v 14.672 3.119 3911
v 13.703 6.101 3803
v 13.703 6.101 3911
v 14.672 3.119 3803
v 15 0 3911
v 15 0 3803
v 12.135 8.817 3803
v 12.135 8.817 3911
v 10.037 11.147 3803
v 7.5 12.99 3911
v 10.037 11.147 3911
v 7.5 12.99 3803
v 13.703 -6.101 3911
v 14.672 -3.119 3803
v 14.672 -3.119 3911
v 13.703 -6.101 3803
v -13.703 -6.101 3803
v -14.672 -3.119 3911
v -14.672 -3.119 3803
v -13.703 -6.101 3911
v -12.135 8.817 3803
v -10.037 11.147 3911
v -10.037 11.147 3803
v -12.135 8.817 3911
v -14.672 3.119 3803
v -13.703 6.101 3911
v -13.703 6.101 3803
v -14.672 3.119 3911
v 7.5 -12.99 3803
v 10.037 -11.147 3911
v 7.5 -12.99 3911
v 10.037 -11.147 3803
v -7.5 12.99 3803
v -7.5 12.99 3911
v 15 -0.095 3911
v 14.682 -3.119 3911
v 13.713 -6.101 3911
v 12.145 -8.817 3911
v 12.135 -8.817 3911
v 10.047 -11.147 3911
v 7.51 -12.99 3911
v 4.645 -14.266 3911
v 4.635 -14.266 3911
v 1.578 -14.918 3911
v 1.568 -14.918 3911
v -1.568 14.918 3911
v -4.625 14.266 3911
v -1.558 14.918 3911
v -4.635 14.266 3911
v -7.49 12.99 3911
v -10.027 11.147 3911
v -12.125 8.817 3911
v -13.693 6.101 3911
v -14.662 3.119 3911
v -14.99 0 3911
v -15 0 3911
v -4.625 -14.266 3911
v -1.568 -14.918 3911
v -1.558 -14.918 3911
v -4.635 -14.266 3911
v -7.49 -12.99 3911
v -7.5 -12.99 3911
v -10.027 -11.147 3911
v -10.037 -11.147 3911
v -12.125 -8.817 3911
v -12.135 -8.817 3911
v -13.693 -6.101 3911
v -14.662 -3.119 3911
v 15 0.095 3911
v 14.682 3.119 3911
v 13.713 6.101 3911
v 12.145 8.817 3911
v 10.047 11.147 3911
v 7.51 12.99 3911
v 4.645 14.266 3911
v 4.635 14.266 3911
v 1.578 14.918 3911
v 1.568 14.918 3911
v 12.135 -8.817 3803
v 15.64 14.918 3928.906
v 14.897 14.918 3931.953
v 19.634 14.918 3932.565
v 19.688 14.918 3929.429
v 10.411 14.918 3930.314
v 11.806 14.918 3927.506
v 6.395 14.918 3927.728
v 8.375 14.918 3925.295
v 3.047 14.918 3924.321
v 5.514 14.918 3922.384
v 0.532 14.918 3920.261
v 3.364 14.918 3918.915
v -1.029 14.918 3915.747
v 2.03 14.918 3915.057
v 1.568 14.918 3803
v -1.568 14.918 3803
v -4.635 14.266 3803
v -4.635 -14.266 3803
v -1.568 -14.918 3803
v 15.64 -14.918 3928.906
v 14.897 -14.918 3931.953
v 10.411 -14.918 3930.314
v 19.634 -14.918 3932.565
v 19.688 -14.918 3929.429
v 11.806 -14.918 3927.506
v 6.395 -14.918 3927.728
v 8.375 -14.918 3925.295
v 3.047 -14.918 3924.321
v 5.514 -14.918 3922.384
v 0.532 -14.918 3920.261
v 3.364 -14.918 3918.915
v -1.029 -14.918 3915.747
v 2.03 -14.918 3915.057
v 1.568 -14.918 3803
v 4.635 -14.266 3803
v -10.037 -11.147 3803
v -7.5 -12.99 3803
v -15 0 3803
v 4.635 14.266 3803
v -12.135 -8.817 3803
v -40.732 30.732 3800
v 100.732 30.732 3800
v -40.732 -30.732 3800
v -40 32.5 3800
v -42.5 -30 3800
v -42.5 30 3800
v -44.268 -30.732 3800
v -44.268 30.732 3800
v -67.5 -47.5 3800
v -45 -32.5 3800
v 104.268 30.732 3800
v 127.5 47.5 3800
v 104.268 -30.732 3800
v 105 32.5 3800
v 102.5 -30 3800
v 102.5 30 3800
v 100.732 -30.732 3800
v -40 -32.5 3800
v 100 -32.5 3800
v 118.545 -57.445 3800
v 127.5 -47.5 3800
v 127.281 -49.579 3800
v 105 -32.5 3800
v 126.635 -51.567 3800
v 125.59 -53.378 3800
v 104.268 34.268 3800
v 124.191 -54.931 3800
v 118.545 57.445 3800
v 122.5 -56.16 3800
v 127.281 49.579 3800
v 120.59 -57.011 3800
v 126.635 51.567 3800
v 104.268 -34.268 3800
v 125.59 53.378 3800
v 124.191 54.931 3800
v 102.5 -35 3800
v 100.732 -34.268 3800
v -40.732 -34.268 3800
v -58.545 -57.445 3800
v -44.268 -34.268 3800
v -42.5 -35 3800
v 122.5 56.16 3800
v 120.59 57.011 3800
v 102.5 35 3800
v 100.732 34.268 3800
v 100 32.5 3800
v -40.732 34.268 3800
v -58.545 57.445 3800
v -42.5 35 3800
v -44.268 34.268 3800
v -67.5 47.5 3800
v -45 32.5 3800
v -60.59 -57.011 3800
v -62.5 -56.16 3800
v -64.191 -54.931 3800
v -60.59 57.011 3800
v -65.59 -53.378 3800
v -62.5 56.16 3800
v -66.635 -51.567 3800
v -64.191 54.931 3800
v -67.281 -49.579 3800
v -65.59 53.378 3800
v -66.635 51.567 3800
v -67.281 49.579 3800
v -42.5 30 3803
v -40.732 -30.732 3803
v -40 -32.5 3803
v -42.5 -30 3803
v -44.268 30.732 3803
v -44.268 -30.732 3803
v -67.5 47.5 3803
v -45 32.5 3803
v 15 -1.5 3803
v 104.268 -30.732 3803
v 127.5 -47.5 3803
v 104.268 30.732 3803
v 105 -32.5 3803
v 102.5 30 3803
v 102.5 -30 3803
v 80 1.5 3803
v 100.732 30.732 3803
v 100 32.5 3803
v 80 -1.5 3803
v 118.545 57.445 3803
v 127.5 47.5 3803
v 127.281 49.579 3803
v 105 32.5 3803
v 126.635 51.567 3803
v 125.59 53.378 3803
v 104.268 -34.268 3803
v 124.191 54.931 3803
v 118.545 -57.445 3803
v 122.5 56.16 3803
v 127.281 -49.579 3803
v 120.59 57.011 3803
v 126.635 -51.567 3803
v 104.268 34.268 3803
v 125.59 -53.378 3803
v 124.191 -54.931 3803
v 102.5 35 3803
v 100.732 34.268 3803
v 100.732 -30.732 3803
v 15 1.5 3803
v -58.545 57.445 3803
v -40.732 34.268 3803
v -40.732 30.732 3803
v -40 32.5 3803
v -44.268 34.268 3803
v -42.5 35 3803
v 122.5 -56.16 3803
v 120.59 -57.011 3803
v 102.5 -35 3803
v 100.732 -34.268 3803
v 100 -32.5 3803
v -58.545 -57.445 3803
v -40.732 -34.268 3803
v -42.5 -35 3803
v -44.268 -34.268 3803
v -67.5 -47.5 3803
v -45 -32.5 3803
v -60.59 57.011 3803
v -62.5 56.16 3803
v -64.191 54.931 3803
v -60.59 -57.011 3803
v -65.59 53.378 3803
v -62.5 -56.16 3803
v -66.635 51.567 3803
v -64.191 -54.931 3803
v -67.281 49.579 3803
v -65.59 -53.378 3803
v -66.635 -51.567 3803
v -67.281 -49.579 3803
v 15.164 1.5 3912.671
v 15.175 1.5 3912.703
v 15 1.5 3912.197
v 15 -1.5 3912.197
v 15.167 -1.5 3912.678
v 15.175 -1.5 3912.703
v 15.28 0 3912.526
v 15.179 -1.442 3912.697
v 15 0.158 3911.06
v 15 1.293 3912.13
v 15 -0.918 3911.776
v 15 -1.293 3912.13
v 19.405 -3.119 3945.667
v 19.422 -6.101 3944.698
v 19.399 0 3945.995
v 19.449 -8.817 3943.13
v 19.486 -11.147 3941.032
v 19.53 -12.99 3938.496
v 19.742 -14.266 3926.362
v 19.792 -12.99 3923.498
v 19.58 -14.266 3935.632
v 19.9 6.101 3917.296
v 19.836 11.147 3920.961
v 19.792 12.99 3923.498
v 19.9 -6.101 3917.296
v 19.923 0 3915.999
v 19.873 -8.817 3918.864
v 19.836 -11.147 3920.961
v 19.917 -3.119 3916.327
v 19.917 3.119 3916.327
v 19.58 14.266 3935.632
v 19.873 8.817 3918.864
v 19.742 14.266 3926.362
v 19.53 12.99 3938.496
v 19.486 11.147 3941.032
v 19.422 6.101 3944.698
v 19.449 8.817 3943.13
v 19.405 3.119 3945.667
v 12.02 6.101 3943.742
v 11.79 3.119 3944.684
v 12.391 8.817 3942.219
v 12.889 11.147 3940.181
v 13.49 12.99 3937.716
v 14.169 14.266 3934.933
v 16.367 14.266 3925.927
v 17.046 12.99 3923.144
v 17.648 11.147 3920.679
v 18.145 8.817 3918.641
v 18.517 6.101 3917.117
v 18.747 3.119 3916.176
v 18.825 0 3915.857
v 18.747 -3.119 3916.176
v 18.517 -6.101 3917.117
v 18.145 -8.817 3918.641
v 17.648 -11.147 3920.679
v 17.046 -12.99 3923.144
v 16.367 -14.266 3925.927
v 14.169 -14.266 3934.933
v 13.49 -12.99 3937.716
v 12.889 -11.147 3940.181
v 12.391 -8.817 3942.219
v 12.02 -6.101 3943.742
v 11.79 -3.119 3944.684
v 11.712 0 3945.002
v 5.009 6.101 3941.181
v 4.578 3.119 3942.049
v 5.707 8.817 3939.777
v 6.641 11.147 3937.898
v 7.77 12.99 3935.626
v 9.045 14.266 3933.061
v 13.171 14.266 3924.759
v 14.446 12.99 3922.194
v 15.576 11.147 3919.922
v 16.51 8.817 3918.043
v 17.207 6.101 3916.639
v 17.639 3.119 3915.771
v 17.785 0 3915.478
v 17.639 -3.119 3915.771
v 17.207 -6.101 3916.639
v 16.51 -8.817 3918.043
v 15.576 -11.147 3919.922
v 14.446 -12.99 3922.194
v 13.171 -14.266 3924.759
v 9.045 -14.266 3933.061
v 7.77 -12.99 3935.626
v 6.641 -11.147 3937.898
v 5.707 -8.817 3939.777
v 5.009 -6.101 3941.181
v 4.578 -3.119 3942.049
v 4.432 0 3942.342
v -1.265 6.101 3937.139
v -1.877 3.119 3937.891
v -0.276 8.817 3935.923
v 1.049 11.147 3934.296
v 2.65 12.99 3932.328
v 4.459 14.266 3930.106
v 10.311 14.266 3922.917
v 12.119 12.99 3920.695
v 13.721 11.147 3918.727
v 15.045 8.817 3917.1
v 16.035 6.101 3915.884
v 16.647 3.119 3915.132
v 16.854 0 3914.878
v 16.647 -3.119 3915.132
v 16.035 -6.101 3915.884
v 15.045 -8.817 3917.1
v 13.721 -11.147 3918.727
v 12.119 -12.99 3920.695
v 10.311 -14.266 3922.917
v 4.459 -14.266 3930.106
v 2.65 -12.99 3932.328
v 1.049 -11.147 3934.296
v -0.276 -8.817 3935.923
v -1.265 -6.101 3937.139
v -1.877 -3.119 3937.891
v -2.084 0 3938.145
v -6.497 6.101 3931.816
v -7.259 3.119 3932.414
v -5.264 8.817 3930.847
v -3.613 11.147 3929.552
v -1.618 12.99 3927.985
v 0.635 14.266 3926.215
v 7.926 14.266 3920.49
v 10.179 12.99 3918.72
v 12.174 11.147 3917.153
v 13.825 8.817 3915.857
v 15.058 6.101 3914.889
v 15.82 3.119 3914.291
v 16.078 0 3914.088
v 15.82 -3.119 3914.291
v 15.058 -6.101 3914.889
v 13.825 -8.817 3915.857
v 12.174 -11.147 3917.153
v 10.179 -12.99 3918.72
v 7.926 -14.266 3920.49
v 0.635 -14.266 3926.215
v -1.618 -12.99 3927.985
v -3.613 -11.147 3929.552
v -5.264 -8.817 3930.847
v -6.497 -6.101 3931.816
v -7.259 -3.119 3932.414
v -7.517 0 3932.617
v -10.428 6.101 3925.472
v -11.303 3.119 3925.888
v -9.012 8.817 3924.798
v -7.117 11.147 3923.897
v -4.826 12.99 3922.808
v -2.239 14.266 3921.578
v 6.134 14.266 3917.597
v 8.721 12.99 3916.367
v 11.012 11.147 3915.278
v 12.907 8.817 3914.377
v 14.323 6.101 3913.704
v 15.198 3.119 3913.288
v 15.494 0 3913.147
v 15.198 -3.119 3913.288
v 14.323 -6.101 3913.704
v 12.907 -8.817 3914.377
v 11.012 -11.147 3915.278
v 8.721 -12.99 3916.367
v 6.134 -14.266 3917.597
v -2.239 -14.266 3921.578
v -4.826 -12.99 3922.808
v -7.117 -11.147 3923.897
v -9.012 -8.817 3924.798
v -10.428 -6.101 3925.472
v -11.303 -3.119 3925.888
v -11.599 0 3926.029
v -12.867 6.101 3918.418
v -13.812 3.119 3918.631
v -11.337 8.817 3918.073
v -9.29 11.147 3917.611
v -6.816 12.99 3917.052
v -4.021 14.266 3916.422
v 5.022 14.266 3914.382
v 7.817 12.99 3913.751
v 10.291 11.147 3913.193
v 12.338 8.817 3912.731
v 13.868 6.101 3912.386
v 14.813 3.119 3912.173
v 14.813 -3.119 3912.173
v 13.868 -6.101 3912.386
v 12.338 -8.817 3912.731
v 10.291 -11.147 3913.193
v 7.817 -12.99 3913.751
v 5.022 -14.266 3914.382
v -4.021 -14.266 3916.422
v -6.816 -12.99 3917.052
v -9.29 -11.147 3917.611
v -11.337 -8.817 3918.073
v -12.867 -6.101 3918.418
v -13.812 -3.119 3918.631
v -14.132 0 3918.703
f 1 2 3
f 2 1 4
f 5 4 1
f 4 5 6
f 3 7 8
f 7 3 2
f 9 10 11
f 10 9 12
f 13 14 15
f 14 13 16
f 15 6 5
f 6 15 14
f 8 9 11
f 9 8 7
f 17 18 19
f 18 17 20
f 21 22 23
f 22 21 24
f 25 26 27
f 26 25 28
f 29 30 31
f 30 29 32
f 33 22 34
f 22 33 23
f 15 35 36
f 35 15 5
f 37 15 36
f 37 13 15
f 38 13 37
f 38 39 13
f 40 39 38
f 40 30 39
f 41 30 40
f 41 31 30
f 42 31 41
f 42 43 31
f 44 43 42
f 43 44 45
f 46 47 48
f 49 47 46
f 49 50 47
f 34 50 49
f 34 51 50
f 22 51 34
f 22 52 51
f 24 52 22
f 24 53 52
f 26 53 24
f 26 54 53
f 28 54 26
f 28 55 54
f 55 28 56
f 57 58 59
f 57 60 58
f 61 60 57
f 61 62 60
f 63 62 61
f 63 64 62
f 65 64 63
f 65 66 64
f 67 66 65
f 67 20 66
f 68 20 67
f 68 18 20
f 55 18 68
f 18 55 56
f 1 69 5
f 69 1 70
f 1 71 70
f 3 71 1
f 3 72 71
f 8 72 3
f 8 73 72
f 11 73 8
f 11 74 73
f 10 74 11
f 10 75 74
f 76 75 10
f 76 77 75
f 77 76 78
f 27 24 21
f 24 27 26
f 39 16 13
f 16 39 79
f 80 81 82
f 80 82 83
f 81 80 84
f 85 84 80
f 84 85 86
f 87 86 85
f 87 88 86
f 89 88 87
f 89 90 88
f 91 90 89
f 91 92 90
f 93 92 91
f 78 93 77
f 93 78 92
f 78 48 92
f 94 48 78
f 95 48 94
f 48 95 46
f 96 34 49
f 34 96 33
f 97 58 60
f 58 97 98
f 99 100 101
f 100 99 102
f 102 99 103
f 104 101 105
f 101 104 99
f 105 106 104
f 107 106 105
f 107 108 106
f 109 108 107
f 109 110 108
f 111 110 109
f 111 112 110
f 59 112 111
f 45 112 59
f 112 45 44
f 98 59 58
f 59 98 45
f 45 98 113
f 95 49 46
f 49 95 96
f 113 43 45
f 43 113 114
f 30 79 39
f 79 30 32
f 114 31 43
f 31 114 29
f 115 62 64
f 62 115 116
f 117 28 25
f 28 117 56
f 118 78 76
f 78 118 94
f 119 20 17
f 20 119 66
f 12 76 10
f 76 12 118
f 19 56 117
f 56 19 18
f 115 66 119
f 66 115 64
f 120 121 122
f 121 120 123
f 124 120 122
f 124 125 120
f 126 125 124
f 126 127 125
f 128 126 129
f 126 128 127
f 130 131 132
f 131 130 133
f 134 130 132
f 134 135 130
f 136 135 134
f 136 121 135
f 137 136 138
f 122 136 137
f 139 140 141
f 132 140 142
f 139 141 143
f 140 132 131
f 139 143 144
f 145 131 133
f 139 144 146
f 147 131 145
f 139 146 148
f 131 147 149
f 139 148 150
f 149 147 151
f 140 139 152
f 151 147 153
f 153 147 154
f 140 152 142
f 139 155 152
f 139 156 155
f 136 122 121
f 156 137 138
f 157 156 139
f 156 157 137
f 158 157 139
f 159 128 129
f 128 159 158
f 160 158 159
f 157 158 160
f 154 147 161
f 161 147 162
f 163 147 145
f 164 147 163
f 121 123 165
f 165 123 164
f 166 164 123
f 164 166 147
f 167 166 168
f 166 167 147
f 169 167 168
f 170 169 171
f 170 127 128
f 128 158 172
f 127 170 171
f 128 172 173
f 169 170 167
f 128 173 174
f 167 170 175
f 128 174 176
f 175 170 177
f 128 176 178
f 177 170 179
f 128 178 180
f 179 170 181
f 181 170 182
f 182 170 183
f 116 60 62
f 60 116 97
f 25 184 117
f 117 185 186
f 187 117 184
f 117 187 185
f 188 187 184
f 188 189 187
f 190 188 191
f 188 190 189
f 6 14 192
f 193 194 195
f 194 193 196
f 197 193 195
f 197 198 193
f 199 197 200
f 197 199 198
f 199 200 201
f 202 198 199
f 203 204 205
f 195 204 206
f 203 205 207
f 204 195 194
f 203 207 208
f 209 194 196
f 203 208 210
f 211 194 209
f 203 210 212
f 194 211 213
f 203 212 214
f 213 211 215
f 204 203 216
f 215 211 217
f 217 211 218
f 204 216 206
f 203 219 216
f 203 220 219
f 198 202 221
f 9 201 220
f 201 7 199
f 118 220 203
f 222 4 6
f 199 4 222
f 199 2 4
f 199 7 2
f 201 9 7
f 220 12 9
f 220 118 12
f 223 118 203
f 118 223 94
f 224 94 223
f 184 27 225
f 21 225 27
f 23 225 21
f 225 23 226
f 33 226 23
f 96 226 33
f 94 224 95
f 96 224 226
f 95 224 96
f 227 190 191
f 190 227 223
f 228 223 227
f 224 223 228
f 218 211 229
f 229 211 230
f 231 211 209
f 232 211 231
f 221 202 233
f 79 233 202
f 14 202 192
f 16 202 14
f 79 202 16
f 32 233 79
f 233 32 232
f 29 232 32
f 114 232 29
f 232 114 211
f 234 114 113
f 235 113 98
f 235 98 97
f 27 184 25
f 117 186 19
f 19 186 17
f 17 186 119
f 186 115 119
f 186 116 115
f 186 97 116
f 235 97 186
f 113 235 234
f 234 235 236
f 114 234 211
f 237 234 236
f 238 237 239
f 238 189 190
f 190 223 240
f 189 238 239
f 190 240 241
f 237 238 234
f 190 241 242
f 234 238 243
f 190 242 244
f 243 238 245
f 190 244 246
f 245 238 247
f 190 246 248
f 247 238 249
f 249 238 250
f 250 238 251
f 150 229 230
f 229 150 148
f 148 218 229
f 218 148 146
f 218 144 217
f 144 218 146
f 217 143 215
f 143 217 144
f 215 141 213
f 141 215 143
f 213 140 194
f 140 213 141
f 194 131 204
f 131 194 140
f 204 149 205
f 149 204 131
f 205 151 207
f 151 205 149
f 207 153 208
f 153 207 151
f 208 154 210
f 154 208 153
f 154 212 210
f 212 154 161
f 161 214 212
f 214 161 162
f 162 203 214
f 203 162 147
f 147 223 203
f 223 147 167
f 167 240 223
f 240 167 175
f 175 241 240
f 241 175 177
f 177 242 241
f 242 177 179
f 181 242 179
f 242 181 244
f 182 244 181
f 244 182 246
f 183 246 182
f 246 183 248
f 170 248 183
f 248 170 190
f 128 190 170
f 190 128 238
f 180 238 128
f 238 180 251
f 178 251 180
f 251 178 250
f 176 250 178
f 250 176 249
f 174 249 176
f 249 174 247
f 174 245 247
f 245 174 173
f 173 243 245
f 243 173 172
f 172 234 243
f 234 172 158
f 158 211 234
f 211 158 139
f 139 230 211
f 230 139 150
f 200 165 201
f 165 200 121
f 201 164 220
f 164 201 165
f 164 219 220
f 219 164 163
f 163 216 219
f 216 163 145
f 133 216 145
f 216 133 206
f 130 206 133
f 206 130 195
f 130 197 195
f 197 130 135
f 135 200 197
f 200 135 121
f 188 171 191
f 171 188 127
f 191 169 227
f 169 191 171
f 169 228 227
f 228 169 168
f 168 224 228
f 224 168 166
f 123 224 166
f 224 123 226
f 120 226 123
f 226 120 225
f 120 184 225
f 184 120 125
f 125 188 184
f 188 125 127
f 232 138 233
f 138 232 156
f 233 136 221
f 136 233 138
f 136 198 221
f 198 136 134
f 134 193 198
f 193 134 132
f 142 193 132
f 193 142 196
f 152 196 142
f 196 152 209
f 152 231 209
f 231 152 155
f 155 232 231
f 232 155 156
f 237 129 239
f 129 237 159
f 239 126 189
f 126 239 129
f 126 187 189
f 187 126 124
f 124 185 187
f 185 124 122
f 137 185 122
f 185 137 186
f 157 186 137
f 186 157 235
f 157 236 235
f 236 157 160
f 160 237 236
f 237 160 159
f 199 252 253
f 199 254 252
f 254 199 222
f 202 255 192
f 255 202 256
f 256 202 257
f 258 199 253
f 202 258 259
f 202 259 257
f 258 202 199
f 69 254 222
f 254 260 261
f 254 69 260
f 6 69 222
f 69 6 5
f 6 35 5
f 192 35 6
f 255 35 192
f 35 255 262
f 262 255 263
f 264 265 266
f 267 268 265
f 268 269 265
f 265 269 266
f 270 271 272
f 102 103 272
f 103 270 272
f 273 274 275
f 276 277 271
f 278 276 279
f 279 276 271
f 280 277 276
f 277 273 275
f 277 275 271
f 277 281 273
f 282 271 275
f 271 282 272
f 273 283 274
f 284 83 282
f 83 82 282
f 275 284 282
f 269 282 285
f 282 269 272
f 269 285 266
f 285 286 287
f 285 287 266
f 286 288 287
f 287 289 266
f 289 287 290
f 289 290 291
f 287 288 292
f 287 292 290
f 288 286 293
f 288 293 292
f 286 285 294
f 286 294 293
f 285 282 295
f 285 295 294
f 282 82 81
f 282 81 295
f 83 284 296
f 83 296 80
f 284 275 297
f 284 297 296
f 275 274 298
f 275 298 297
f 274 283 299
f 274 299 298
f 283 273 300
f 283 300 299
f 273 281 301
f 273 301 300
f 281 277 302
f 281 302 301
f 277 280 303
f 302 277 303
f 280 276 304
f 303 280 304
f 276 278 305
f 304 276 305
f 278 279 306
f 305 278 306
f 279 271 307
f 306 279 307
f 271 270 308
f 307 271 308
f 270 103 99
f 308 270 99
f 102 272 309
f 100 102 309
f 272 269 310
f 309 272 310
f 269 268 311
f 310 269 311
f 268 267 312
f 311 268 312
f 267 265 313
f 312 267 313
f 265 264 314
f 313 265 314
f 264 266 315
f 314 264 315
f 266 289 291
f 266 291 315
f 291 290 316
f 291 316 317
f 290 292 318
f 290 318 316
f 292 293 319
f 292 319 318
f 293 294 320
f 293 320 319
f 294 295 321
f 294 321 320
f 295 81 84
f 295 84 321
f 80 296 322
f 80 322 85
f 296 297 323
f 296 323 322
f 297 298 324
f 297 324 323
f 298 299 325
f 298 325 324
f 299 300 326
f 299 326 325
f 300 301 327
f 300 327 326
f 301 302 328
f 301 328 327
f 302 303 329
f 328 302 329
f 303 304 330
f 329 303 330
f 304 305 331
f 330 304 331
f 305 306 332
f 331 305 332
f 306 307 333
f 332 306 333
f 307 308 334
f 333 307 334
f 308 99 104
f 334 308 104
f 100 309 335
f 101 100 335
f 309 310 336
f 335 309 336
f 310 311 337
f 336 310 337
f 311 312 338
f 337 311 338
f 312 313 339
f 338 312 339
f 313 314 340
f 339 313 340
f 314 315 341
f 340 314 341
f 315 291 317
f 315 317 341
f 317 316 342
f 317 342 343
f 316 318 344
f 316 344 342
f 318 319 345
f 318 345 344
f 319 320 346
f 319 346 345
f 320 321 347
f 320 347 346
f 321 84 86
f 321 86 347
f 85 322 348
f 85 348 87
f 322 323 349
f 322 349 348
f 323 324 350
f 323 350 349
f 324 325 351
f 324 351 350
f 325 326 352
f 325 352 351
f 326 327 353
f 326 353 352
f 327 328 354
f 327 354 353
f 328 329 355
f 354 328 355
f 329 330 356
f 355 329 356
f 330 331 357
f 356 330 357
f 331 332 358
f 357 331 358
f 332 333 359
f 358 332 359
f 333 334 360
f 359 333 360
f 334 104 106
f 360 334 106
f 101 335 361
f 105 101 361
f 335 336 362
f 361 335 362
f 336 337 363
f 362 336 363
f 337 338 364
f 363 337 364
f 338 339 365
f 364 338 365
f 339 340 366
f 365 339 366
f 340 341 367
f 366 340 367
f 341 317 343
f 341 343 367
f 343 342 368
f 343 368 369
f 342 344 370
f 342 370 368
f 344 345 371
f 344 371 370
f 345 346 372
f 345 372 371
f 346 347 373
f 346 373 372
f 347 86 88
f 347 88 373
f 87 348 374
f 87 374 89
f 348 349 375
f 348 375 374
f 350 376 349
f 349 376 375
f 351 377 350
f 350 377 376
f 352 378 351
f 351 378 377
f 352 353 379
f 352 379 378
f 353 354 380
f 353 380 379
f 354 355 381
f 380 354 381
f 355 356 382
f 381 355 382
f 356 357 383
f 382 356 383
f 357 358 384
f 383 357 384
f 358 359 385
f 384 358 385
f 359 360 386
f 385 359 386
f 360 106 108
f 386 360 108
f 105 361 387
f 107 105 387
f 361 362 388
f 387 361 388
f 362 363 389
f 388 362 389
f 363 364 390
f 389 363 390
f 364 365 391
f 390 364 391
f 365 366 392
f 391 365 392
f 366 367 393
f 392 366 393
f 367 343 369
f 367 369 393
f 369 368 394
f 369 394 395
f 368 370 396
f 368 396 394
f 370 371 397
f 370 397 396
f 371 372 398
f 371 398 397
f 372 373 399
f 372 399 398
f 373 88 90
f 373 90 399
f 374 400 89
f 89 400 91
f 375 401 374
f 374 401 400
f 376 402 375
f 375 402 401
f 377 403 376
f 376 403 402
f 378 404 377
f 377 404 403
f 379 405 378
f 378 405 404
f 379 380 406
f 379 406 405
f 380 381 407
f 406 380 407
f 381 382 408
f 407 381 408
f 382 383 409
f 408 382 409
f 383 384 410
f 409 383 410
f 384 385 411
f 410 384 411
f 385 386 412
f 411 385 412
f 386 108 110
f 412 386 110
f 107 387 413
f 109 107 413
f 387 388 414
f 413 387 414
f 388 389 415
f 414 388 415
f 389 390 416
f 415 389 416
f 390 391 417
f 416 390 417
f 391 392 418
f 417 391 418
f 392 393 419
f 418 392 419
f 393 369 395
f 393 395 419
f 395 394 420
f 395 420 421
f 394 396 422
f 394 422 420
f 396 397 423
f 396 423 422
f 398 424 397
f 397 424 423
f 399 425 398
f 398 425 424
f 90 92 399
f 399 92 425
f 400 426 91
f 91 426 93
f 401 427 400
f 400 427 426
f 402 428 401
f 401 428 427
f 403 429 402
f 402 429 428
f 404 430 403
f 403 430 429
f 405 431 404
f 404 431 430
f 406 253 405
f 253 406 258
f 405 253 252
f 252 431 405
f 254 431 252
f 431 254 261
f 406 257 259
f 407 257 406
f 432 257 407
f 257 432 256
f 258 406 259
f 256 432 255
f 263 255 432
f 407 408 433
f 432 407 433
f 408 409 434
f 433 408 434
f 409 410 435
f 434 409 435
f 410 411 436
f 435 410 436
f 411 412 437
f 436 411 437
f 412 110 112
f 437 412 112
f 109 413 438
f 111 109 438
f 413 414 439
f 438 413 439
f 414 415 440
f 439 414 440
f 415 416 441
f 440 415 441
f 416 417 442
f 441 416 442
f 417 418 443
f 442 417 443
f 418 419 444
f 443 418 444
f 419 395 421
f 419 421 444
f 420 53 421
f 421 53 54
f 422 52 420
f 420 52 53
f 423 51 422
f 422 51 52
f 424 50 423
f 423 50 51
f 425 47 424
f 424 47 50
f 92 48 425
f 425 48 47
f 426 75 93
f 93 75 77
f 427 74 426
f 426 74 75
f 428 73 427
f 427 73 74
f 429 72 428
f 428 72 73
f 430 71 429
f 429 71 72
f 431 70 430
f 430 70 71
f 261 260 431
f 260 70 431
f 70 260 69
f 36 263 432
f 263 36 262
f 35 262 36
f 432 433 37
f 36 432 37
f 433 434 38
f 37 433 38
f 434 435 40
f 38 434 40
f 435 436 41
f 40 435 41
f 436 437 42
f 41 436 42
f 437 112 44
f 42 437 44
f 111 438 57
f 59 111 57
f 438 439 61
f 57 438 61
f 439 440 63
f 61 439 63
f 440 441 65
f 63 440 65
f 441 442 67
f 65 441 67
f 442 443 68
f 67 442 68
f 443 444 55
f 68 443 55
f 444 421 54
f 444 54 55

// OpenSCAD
// baseplate constants
screwhole_offset = 15;
screwhole_radius = 2.5;
baseplate_x = 175;
baseplate_y = 95;
platethickness=3;
piperadius=15;
// ladder constants
start_depth = 110;
incline_deg = 1;
width = 320;
step_spacing=300;       // space between steps
num_steps=15;
num_segments=5;
steps_seg=num_steps/num_segments;
echo("    steps per segment : ",steps_seg);
total_length = (1+num_steps)*step_spacing;
segment_length = (steps_seg+1)*step_spacing;
echo(" total length : ",total_length)
echo(" segment length : ",segment_length)

translate([0,0,total_length-1000])
//all_segments();
//segment(5);
baseplate("up",110,1);

module all_segments(){
    for (i = [1:1:num_segments]){
        segment(i);
    }
}

module segment(i){
    
    z_delta = (i-1)*step_spacing*(steps_seg+1);
    x_delta = z_delta*tan(incline_deg);
    start_depth=start_depth+x_delta;
    echo(round(x_delta));
    translate([0,0,-z_delta])    
    segment();
    module segment(){
    rail(steps_seg,step_spacing,"left",start_depth);
    translate([0,width,0])
    rail(steps_seg,step_spacing,"right",start_depth);
    
    for (i = [1:1:steps_seg+1]){
        z_delta = (i-1)*step_spacing;
        x_delta = z_delta*tan(incline_deg);
        //echo(round(x_delta));
        translate([x_delta,0,step_spacing*steps_seg-z_delta])
        step(start_depth);
    }
}
}
module step(start_depth){
    translate([start_depth-piperadius/2,width+piperadius,20+piperadius/2])
    rotate([90,0,0])
    cylinder(r=piperadius, h=width+piperadius*2);
}
module rail(steps,spacing,side,start_depth){
    adjacent = (step_spacing*(steps_seg))+piperadius*2;
    hyp = adjacent / cos(incline_deg);
    opp = adjacent * tan(incline_deg);
    //echo("  adjacent    : ", adjacent);
    //echo("  hypotenouse : ", hyp);
    //echo("  opposite : ", opp);
    translate([start_depth+20+opp,0,piperadius])
    rotate([0,-incline_deg,0])
    cylinder(r=piperadius, h=hyp);
    rotate([0,90,0]) baseplate("down",opp,start_depth);
    translate([0,0,step_spacing*(steps_seg)+60])
    rotate([0,90,0]) baseplate("up",0,start_depth);
    mid_x_delta = ((step_spacing*(steps_seg)+60)/2)*tan(incline_deg);
    if (side=="right"){
        translate([0,0,(step_spacing*(steps_seg)+60)/2])
        rotate([0,90,0]) baseplate("midr",mid_x_delta,start_depth);
    }else if(side=="left"){
        translate([0,0,(step_spacing*(steps_seg)+60)/2])
        rotate([0,90,0]) baseplate("midl",mid_x_delta,start_depth);
    }
    
}

module baseplate(type,depth,start_depth){
    if (type=="midr"){
        translate([-20,20,0]){
            baseplate();
            translate([0,0,3]) rotate([90,0,0]) armstrut();
        }
    } else if (type=="midl"){
        translate([-20,-20,0]){
            baseplate();
            translate([0,0,3]) rotate([90,0,0]) armstrut();
        }
    }else{
        baseplate();
        translate([0,0,3]) rotate([90,0,0]) armstrut();
    }
    module baseplate(){
        cylinder(r=piperadius, start_depth+depth);
    linear_extrude(height=platethickness){
        translate([30,0,0]){
            difference(){
                    roundedplate();
                    translate([baseplate_x/2-screwhole_offset,baseplate_y/2-screwhole_offset,0]) circle(screwhole_radius);
                    translate([baseplate_x/2-screwhole_offset,-
                    baseplate_y/2+screwhole_offset,0]) circle(screwhole_radius);
                    translate([-baseplate_x/2+screwhole_offset,baseplate_y/2-screwhole_offset,0]) circle(screwhole_radius);
                    translate([-baseplate_x/2+screwhole_offset,-baseplate_y/2+screwhole_offset,0]) circle(screwhole_radius);
                }
            }
        }
    }
    translate([0,0,depth])
    arc(20,type,start_depth);
    
}

module roundedplate(){
minkowski()
{
    square([baseplate_x,baseplate_y],center=true);
    circle(r = 10);
}
}

module arc(rad,type,start_depth){
    eps = 0.01;
    //echo(type);
    translate([eps-rad, 0, start_depth])
    if (type=="down"){
        rotate([90,0,0]) arc(90+incline_deg);
    } else if( type=="up"){
        translate([40,0,0])
        rotate([90,-90-incline_deg,0]) arc(90-incline_deg);
    } else if( type=="midr"){
        rotate([90,0,90]) arc(90);
    } else if( type=="midl"){
        rotate([90,0,-90]) arc(90);
    }
    module arc(angle){
       rotate_extrude(angle=angle, convexity=10)
           translate([rad, 0]) circle(piperadius);     
        }
    
}

module armstrut(){
    points = [[15,0], [80,0], [15,110]];
    translate([0,0,-platethickness/2]) linear_extrude(height=platethickness){
    polygon(points=points);
    }
}
